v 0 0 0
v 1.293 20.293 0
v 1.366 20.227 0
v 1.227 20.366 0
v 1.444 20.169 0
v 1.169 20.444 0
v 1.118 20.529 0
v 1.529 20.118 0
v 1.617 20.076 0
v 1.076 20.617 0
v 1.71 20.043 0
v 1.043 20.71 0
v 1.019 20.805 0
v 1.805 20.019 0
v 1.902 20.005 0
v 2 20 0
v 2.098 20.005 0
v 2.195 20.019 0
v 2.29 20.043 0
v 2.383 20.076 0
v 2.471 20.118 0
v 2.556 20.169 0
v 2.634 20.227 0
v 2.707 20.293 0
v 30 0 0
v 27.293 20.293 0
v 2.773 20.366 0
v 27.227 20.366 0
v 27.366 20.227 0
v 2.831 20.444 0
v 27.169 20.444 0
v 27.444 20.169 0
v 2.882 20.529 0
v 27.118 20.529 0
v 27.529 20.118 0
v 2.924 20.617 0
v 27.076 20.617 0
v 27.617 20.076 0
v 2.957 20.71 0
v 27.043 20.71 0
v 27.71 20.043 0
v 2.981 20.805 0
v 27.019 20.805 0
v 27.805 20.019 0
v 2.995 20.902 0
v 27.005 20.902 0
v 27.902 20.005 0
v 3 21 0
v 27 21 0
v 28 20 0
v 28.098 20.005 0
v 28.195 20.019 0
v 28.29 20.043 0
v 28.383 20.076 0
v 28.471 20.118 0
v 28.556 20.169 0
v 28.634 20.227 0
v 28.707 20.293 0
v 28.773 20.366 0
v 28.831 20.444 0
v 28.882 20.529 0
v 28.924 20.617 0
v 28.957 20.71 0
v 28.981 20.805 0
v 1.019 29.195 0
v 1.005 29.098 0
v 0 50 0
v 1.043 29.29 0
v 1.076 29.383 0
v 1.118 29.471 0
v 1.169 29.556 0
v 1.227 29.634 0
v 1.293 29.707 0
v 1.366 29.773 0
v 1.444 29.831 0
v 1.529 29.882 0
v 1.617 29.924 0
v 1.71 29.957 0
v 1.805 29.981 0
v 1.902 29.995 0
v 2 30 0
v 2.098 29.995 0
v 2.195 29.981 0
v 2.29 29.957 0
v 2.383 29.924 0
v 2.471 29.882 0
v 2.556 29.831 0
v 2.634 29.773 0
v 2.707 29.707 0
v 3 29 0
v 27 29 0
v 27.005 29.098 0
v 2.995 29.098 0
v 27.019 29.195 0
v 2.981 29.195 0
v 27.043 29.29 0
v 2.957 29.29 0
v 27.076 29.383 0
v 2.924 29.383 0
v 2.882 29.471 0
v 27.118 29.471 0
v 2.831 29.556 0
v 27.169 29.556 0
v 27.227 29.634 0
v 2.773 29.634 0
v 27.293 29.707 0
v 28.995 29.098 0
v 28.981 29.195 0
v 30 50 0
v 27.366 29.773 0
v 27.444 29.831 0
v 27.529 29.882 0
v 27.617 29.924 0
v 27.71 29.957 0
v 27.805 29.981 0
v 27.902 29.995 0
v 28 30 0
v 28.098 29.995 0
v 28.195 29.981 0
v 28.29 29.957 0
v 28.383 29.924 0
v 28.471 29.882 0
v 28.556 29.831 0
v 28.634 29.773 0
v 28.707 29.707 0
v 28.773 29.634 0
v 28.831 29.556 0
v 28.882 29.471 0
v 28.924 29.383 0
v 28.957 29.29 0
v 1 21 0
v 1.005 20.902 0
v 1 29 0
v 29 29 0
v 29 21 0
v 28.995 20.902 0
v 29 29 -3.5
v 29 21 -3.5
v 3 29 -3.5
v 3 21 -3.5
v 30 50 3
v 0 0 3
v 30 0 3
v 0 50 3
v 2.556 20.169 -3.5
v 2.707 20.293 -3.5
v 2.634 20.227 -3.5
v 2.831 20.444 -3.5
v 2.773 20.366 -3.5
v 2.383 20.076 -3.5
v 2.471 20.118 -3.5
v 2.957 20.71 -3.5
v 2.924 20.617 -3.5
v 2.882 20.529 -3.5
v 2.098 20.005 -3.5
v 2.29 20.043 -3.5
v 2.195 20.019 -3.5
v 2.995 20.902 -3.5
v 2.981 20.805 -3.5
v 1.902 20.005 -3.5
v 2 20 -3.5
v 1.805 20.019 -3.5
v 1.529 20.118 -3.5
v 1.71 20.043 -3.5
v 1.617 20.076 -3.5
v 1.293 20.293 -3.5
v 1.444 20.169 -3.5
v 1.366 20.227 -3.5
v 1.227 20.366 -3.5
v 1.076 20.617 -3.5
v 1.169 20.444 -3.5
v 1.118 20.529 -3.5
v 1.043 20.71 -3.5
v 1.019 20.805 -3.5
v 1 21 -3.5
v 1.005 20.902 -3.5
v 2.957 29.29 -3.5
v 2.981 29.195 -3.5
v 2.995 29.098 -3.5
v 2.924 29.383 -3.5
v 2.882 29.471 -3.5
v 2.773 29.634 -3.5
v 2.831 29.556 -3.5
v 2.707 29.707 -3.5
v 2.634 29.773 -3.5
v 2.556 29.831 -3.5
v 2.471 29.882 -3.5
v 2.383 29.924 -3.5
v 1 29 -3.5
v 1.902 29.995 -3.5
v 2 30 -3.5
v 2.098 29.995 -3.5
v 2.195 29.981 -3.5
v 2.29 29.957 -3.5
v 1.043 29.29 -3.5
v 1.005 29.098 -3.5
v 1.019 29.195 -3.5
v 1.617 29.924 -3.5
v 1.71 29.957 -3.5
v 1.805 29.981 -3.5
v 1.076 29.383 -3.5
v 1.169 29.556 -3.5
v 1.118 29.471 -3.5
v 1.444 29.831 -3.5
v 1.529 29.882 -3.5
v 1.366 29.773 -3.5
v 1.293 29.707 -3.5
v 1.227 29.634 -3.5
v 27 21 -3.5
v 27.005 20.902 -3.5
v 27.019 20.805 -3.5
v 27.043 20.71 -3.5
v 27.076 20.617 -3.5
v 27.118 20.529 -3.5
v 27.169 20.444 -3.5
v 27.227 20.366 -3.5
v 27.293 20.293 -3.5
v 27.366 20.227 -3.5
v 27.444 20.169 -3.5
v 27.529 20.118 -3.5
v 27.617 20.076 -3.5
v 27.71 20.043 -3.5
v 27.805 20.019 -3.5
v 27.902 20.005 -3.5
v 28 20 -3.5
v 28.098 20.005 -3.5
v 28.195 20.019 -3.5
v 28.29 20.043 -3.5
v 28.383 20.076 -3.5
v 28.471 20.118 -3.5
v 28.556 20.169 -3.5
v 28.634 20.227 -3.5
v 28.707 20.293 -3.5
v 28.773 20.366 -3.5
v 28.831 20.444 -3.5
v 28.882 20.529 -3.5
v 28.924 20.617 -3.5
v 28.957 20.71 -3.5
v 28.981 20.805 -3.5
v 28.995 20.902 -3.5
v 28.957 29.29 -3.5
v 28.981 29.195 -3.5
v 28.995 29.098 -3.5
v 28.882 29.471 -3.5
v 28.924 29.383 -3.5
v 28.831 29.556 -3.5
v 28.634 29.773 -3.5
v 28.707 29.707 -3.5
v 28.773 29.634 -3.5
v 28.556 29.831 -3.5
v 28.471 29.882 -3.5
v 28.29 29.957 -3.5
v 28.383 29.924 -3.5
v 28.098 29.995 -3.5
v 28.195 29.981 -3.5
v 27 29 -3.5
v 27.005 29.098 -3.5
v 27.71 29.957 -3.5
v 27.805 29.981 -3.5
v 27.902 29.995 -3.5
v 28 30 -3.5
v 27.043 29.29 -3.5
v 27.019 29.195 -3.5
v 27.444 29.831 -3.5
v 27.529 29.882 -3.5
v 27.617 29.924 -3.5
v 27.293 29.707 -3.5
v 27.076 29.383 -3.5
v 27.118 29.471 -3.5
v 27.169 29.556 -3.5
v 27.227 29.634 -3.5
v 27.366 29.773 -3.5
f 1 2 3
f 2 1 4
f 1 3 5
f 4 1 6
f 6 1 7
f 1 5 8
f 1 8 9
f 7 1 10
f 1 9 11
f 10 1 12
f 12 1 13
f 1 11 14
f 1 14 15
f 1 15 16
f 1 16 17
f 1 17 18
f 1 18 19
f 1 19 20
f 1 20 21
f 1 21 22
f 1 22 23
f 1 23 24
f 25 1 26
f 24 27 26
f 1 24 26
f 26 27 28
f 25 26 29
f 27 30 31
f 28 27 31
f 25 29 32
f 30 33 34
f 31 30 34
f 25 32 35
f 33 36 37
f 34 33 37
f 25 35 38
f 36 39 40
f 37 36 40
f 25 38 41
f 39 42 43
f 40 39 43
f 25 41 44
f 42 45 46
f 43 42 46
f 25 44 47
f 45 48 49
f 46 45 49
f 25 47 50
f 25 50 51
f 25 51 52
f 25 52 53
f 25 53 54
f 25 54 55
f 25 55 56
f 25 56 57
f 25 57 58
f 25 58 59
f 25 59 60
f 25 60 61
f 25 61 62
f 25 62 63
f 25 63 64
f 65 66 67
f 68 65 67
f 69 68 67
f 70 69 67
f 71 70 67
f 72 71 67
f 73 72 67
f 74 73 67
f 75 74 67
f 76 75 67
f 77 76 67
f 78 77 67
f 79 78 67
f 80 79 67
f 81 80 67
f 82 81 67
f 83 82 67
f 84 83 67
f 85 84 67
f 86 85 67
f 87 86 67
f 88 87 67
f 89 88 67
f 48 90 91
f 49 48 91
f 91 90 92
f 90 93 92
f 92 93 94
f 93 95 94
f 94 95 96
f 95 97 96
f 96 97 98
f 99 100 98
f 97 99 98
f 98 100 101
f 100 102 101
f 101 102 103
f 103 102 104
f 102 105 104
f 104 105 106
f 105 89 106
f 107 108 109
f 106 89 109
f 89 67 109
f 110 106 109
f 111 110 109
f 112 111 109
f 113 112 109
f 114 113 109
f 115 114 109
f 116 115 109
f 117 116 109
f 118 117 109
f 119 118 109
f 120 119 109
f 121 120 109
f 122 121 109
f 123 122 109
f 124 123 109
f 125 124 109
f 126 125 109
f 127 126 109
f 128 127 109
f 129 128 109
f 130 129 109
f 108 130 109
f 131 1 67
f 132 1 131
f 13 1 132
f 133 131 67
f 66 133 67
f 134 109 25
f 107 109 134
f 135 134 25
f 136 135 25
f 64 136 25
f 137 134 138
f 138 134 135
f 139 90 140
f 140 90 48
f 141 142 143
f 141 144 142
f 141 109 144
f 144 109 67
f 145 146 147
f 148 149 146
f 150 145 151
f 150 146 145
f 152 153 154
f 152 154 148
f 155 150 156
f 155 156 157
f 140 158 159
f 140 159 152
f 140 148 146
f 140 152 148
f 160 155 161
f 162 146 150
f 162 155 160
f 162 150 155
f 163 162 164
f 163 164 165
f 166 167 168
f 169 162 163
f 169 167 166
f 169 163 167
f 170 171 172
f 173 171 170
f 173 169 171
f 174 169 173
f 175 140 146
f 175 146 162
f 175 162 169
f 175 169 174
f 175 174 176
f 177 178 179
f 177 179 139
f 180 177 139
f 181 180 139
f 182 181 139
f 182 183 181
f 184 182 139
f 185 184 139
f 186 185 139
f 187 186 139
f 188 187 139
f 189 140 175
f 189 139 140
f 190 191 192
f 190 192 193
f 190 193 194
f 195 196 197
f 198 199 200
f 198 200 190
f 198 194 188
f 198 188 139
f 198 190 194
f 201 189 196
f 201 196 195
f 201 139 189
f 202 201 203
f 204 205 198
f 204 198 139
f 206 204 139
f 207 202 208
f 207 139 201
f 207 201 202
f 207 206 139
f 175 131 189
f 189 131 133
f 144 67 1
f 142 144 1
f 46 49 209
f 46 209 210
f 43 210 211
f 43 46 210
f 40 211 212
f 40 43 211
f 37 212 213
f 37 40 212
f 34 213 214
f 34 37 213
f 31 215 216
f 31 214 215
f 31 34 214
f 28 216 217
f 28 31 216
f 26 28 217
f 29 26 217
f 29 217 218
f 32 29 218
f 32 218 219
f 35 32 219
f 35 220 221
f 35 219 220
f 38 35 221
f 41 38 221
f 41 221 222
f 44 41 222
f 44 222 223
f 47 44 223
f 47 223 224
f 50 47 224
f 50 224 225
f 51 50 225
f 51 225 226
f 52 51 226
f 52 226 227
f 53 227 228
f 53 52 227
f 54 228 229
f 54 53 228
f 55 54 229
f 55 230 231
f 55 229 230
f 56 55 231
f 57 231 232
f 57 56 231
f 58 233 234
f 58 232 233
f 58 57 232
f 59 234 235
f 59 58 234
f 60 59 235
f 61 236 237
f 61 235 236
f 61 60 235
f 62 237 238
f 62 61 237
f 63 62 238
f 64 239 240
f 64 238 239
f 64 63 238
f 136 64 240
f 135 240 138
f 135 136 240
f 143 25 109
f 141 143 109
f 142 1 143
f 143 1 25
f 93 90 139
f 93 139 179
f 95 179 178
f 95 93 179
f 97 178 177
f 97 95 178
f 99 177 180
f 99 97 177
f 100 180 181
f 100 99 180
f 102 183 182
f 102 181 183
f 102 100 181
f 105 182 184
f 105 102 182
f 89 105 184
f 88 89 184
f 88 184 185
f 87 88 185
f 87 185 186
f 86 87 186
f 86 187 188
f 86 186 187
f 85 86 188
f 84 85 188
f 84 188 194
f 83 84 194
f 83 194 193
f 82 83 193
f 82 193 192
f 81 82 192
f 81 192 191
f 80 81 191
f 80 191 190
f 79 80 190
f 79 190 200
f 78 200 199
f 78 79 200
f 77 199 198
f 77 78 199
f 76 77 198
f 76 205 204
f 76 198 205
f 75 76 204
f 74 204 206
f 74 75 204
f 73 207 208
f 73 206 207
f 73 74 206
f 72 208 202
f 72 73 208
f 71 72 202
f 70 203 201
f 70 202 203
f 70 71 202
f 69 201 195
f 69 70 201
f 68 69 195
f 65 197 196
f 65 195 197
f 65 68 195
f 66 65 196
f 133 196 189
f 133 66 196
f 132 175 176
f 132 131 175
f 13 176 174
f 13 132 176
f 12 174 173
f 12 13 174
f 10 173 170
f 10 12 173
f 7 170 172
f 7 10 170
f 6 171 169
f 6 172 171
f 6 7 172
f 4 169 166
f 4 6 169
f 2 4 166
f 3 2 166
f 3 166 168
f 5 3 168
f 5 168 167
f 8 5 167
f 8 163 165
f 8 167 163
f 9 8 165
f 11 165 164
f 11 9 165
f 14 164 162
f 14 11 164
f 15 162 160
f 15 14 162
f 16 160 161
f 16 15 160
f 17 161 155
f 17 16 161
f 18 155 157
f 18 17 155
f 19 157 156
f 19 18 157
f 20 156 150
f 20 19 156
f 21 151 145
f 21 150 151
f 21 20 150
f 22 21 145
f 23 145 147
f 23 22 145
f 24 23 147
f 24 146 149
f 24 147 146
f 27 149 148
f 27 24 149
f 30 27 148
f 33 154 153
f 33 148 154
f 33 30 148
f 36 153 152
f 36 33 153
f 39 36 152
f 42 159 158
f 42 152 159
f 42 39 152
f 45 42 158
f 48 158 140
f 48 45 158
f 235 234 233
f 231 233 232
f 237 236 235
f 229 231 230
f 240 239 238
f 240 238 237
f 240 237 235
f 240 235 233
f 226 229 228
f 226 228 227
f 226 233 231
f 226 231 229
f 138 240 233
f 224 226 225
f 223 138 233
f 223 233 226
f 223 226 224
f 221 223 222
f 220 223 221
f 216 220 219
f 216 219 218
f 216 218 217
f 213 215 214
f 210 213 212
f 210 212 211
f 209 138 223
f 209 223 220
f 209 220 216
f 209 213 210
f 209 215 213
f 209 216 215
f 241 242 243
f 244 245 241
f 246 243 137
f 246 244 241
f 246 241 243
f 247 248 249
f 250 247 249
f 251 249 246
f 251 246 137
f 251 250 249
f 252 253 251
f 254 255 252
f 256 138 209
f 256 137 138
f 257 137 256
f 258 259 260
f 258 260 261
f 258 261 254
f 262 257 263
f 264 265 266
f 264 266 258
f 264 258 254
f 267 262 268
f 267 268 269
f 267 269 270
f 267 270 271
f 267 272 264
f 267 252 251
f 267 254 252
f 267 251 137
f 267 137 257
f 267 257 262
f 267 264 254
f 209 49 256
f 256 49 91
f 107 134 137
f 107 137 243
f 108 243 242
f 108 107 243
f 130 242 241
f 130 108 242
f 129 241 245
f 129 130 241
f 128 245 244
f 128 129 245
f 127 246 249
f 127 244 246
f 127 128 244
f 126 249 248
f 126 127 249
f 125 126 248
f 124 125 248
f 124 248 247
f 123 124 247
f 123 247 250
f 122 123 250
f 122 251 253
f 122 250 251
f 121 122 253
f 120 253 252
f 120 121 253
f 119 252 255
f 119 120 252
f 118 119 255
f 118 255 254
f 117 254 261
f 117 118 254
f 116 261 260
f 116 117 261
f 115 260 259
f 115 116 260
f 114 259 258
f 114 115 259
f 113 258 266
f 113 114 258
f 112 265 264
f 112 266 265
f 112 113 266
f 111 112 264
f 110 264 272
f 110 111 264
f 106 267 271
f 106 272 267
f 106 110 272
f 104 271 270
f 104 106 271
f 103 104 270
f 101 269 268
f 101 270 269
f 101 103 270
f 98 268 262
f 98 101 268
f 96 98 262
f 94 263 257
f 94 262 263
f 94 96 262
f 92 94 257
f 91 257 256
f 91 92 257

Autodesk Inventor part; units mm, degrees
ref_plane "YZ Plane" through (0, 0, 0) normal (1, 0, 0) x (0, 1, 0)
ref_plane "XZ Plane" through (0, 0, 0) normal (0, 1, 0) x (-1, 0, 0)
sketch "Sketch1" plane through (0, 0, 0) normal (0, 0, 1) x (1, 0, 0)
  line L0 (0, 0) -> (30, 0)
  line L1 (30, 0) -> (30, 50)
  line L2 (30, 50) -> (0, 50)
  line L3 (0, 50) -> (0, 0)
  dimension "d0" = 30
  dimension "d1" = 50
extrude "Extrusion1" add sketch "Sketch1" along normal blind 3
ref_plane "Work Plane1" through (15, 0, 0) normal (1, 0, 0) x (0, 0, -1)
sketch "Sketch4" plane through (0, 0, 0) normal (0, 0, -1) x (-1, 0, 0)
  line L0 (-28, 30) -> (-28, 20) construction
  line L1 (-29, 29) -> (-29, 21)
  line L2 (-27, 21) -> (-27, 29)
  arc A0 (-27, 29) -> (-29, 29) centre (-28, 29) ccw
  arc A1 (-29, 21) -> (-27, 21) centre (-28, 21) ccw
  line L3 (-2, 30) -> (-2, 20) construction
  line L4 (-3, 29) -> (-3, 21)
  line L5 (-1, 21) -> (-1, 29)
  arc A2 (-1, 29) -> (-3, 29) centre (-2, 29) ccw
  arc A3 (-3, 21) -> (-1, 21) centre (-2, 21) ccw
  line L6 (-30, 0) -> (-30, 50) projected
  point P0 (0, 0)
  point P1 (-28, 25)
  point P2 (-2, 25)
  dimension "d19" = 25
  dimension "d20" = 1
  dimension "d21" = 1
  dimension "d22" = 10
  dimension "d23" = 10
  dimension "d25" = 1
  dimension "d29" = 1
extrude "Extrusion4" add sketch "Sketch4" along normal blind 3.5
properties part number "motor box"
